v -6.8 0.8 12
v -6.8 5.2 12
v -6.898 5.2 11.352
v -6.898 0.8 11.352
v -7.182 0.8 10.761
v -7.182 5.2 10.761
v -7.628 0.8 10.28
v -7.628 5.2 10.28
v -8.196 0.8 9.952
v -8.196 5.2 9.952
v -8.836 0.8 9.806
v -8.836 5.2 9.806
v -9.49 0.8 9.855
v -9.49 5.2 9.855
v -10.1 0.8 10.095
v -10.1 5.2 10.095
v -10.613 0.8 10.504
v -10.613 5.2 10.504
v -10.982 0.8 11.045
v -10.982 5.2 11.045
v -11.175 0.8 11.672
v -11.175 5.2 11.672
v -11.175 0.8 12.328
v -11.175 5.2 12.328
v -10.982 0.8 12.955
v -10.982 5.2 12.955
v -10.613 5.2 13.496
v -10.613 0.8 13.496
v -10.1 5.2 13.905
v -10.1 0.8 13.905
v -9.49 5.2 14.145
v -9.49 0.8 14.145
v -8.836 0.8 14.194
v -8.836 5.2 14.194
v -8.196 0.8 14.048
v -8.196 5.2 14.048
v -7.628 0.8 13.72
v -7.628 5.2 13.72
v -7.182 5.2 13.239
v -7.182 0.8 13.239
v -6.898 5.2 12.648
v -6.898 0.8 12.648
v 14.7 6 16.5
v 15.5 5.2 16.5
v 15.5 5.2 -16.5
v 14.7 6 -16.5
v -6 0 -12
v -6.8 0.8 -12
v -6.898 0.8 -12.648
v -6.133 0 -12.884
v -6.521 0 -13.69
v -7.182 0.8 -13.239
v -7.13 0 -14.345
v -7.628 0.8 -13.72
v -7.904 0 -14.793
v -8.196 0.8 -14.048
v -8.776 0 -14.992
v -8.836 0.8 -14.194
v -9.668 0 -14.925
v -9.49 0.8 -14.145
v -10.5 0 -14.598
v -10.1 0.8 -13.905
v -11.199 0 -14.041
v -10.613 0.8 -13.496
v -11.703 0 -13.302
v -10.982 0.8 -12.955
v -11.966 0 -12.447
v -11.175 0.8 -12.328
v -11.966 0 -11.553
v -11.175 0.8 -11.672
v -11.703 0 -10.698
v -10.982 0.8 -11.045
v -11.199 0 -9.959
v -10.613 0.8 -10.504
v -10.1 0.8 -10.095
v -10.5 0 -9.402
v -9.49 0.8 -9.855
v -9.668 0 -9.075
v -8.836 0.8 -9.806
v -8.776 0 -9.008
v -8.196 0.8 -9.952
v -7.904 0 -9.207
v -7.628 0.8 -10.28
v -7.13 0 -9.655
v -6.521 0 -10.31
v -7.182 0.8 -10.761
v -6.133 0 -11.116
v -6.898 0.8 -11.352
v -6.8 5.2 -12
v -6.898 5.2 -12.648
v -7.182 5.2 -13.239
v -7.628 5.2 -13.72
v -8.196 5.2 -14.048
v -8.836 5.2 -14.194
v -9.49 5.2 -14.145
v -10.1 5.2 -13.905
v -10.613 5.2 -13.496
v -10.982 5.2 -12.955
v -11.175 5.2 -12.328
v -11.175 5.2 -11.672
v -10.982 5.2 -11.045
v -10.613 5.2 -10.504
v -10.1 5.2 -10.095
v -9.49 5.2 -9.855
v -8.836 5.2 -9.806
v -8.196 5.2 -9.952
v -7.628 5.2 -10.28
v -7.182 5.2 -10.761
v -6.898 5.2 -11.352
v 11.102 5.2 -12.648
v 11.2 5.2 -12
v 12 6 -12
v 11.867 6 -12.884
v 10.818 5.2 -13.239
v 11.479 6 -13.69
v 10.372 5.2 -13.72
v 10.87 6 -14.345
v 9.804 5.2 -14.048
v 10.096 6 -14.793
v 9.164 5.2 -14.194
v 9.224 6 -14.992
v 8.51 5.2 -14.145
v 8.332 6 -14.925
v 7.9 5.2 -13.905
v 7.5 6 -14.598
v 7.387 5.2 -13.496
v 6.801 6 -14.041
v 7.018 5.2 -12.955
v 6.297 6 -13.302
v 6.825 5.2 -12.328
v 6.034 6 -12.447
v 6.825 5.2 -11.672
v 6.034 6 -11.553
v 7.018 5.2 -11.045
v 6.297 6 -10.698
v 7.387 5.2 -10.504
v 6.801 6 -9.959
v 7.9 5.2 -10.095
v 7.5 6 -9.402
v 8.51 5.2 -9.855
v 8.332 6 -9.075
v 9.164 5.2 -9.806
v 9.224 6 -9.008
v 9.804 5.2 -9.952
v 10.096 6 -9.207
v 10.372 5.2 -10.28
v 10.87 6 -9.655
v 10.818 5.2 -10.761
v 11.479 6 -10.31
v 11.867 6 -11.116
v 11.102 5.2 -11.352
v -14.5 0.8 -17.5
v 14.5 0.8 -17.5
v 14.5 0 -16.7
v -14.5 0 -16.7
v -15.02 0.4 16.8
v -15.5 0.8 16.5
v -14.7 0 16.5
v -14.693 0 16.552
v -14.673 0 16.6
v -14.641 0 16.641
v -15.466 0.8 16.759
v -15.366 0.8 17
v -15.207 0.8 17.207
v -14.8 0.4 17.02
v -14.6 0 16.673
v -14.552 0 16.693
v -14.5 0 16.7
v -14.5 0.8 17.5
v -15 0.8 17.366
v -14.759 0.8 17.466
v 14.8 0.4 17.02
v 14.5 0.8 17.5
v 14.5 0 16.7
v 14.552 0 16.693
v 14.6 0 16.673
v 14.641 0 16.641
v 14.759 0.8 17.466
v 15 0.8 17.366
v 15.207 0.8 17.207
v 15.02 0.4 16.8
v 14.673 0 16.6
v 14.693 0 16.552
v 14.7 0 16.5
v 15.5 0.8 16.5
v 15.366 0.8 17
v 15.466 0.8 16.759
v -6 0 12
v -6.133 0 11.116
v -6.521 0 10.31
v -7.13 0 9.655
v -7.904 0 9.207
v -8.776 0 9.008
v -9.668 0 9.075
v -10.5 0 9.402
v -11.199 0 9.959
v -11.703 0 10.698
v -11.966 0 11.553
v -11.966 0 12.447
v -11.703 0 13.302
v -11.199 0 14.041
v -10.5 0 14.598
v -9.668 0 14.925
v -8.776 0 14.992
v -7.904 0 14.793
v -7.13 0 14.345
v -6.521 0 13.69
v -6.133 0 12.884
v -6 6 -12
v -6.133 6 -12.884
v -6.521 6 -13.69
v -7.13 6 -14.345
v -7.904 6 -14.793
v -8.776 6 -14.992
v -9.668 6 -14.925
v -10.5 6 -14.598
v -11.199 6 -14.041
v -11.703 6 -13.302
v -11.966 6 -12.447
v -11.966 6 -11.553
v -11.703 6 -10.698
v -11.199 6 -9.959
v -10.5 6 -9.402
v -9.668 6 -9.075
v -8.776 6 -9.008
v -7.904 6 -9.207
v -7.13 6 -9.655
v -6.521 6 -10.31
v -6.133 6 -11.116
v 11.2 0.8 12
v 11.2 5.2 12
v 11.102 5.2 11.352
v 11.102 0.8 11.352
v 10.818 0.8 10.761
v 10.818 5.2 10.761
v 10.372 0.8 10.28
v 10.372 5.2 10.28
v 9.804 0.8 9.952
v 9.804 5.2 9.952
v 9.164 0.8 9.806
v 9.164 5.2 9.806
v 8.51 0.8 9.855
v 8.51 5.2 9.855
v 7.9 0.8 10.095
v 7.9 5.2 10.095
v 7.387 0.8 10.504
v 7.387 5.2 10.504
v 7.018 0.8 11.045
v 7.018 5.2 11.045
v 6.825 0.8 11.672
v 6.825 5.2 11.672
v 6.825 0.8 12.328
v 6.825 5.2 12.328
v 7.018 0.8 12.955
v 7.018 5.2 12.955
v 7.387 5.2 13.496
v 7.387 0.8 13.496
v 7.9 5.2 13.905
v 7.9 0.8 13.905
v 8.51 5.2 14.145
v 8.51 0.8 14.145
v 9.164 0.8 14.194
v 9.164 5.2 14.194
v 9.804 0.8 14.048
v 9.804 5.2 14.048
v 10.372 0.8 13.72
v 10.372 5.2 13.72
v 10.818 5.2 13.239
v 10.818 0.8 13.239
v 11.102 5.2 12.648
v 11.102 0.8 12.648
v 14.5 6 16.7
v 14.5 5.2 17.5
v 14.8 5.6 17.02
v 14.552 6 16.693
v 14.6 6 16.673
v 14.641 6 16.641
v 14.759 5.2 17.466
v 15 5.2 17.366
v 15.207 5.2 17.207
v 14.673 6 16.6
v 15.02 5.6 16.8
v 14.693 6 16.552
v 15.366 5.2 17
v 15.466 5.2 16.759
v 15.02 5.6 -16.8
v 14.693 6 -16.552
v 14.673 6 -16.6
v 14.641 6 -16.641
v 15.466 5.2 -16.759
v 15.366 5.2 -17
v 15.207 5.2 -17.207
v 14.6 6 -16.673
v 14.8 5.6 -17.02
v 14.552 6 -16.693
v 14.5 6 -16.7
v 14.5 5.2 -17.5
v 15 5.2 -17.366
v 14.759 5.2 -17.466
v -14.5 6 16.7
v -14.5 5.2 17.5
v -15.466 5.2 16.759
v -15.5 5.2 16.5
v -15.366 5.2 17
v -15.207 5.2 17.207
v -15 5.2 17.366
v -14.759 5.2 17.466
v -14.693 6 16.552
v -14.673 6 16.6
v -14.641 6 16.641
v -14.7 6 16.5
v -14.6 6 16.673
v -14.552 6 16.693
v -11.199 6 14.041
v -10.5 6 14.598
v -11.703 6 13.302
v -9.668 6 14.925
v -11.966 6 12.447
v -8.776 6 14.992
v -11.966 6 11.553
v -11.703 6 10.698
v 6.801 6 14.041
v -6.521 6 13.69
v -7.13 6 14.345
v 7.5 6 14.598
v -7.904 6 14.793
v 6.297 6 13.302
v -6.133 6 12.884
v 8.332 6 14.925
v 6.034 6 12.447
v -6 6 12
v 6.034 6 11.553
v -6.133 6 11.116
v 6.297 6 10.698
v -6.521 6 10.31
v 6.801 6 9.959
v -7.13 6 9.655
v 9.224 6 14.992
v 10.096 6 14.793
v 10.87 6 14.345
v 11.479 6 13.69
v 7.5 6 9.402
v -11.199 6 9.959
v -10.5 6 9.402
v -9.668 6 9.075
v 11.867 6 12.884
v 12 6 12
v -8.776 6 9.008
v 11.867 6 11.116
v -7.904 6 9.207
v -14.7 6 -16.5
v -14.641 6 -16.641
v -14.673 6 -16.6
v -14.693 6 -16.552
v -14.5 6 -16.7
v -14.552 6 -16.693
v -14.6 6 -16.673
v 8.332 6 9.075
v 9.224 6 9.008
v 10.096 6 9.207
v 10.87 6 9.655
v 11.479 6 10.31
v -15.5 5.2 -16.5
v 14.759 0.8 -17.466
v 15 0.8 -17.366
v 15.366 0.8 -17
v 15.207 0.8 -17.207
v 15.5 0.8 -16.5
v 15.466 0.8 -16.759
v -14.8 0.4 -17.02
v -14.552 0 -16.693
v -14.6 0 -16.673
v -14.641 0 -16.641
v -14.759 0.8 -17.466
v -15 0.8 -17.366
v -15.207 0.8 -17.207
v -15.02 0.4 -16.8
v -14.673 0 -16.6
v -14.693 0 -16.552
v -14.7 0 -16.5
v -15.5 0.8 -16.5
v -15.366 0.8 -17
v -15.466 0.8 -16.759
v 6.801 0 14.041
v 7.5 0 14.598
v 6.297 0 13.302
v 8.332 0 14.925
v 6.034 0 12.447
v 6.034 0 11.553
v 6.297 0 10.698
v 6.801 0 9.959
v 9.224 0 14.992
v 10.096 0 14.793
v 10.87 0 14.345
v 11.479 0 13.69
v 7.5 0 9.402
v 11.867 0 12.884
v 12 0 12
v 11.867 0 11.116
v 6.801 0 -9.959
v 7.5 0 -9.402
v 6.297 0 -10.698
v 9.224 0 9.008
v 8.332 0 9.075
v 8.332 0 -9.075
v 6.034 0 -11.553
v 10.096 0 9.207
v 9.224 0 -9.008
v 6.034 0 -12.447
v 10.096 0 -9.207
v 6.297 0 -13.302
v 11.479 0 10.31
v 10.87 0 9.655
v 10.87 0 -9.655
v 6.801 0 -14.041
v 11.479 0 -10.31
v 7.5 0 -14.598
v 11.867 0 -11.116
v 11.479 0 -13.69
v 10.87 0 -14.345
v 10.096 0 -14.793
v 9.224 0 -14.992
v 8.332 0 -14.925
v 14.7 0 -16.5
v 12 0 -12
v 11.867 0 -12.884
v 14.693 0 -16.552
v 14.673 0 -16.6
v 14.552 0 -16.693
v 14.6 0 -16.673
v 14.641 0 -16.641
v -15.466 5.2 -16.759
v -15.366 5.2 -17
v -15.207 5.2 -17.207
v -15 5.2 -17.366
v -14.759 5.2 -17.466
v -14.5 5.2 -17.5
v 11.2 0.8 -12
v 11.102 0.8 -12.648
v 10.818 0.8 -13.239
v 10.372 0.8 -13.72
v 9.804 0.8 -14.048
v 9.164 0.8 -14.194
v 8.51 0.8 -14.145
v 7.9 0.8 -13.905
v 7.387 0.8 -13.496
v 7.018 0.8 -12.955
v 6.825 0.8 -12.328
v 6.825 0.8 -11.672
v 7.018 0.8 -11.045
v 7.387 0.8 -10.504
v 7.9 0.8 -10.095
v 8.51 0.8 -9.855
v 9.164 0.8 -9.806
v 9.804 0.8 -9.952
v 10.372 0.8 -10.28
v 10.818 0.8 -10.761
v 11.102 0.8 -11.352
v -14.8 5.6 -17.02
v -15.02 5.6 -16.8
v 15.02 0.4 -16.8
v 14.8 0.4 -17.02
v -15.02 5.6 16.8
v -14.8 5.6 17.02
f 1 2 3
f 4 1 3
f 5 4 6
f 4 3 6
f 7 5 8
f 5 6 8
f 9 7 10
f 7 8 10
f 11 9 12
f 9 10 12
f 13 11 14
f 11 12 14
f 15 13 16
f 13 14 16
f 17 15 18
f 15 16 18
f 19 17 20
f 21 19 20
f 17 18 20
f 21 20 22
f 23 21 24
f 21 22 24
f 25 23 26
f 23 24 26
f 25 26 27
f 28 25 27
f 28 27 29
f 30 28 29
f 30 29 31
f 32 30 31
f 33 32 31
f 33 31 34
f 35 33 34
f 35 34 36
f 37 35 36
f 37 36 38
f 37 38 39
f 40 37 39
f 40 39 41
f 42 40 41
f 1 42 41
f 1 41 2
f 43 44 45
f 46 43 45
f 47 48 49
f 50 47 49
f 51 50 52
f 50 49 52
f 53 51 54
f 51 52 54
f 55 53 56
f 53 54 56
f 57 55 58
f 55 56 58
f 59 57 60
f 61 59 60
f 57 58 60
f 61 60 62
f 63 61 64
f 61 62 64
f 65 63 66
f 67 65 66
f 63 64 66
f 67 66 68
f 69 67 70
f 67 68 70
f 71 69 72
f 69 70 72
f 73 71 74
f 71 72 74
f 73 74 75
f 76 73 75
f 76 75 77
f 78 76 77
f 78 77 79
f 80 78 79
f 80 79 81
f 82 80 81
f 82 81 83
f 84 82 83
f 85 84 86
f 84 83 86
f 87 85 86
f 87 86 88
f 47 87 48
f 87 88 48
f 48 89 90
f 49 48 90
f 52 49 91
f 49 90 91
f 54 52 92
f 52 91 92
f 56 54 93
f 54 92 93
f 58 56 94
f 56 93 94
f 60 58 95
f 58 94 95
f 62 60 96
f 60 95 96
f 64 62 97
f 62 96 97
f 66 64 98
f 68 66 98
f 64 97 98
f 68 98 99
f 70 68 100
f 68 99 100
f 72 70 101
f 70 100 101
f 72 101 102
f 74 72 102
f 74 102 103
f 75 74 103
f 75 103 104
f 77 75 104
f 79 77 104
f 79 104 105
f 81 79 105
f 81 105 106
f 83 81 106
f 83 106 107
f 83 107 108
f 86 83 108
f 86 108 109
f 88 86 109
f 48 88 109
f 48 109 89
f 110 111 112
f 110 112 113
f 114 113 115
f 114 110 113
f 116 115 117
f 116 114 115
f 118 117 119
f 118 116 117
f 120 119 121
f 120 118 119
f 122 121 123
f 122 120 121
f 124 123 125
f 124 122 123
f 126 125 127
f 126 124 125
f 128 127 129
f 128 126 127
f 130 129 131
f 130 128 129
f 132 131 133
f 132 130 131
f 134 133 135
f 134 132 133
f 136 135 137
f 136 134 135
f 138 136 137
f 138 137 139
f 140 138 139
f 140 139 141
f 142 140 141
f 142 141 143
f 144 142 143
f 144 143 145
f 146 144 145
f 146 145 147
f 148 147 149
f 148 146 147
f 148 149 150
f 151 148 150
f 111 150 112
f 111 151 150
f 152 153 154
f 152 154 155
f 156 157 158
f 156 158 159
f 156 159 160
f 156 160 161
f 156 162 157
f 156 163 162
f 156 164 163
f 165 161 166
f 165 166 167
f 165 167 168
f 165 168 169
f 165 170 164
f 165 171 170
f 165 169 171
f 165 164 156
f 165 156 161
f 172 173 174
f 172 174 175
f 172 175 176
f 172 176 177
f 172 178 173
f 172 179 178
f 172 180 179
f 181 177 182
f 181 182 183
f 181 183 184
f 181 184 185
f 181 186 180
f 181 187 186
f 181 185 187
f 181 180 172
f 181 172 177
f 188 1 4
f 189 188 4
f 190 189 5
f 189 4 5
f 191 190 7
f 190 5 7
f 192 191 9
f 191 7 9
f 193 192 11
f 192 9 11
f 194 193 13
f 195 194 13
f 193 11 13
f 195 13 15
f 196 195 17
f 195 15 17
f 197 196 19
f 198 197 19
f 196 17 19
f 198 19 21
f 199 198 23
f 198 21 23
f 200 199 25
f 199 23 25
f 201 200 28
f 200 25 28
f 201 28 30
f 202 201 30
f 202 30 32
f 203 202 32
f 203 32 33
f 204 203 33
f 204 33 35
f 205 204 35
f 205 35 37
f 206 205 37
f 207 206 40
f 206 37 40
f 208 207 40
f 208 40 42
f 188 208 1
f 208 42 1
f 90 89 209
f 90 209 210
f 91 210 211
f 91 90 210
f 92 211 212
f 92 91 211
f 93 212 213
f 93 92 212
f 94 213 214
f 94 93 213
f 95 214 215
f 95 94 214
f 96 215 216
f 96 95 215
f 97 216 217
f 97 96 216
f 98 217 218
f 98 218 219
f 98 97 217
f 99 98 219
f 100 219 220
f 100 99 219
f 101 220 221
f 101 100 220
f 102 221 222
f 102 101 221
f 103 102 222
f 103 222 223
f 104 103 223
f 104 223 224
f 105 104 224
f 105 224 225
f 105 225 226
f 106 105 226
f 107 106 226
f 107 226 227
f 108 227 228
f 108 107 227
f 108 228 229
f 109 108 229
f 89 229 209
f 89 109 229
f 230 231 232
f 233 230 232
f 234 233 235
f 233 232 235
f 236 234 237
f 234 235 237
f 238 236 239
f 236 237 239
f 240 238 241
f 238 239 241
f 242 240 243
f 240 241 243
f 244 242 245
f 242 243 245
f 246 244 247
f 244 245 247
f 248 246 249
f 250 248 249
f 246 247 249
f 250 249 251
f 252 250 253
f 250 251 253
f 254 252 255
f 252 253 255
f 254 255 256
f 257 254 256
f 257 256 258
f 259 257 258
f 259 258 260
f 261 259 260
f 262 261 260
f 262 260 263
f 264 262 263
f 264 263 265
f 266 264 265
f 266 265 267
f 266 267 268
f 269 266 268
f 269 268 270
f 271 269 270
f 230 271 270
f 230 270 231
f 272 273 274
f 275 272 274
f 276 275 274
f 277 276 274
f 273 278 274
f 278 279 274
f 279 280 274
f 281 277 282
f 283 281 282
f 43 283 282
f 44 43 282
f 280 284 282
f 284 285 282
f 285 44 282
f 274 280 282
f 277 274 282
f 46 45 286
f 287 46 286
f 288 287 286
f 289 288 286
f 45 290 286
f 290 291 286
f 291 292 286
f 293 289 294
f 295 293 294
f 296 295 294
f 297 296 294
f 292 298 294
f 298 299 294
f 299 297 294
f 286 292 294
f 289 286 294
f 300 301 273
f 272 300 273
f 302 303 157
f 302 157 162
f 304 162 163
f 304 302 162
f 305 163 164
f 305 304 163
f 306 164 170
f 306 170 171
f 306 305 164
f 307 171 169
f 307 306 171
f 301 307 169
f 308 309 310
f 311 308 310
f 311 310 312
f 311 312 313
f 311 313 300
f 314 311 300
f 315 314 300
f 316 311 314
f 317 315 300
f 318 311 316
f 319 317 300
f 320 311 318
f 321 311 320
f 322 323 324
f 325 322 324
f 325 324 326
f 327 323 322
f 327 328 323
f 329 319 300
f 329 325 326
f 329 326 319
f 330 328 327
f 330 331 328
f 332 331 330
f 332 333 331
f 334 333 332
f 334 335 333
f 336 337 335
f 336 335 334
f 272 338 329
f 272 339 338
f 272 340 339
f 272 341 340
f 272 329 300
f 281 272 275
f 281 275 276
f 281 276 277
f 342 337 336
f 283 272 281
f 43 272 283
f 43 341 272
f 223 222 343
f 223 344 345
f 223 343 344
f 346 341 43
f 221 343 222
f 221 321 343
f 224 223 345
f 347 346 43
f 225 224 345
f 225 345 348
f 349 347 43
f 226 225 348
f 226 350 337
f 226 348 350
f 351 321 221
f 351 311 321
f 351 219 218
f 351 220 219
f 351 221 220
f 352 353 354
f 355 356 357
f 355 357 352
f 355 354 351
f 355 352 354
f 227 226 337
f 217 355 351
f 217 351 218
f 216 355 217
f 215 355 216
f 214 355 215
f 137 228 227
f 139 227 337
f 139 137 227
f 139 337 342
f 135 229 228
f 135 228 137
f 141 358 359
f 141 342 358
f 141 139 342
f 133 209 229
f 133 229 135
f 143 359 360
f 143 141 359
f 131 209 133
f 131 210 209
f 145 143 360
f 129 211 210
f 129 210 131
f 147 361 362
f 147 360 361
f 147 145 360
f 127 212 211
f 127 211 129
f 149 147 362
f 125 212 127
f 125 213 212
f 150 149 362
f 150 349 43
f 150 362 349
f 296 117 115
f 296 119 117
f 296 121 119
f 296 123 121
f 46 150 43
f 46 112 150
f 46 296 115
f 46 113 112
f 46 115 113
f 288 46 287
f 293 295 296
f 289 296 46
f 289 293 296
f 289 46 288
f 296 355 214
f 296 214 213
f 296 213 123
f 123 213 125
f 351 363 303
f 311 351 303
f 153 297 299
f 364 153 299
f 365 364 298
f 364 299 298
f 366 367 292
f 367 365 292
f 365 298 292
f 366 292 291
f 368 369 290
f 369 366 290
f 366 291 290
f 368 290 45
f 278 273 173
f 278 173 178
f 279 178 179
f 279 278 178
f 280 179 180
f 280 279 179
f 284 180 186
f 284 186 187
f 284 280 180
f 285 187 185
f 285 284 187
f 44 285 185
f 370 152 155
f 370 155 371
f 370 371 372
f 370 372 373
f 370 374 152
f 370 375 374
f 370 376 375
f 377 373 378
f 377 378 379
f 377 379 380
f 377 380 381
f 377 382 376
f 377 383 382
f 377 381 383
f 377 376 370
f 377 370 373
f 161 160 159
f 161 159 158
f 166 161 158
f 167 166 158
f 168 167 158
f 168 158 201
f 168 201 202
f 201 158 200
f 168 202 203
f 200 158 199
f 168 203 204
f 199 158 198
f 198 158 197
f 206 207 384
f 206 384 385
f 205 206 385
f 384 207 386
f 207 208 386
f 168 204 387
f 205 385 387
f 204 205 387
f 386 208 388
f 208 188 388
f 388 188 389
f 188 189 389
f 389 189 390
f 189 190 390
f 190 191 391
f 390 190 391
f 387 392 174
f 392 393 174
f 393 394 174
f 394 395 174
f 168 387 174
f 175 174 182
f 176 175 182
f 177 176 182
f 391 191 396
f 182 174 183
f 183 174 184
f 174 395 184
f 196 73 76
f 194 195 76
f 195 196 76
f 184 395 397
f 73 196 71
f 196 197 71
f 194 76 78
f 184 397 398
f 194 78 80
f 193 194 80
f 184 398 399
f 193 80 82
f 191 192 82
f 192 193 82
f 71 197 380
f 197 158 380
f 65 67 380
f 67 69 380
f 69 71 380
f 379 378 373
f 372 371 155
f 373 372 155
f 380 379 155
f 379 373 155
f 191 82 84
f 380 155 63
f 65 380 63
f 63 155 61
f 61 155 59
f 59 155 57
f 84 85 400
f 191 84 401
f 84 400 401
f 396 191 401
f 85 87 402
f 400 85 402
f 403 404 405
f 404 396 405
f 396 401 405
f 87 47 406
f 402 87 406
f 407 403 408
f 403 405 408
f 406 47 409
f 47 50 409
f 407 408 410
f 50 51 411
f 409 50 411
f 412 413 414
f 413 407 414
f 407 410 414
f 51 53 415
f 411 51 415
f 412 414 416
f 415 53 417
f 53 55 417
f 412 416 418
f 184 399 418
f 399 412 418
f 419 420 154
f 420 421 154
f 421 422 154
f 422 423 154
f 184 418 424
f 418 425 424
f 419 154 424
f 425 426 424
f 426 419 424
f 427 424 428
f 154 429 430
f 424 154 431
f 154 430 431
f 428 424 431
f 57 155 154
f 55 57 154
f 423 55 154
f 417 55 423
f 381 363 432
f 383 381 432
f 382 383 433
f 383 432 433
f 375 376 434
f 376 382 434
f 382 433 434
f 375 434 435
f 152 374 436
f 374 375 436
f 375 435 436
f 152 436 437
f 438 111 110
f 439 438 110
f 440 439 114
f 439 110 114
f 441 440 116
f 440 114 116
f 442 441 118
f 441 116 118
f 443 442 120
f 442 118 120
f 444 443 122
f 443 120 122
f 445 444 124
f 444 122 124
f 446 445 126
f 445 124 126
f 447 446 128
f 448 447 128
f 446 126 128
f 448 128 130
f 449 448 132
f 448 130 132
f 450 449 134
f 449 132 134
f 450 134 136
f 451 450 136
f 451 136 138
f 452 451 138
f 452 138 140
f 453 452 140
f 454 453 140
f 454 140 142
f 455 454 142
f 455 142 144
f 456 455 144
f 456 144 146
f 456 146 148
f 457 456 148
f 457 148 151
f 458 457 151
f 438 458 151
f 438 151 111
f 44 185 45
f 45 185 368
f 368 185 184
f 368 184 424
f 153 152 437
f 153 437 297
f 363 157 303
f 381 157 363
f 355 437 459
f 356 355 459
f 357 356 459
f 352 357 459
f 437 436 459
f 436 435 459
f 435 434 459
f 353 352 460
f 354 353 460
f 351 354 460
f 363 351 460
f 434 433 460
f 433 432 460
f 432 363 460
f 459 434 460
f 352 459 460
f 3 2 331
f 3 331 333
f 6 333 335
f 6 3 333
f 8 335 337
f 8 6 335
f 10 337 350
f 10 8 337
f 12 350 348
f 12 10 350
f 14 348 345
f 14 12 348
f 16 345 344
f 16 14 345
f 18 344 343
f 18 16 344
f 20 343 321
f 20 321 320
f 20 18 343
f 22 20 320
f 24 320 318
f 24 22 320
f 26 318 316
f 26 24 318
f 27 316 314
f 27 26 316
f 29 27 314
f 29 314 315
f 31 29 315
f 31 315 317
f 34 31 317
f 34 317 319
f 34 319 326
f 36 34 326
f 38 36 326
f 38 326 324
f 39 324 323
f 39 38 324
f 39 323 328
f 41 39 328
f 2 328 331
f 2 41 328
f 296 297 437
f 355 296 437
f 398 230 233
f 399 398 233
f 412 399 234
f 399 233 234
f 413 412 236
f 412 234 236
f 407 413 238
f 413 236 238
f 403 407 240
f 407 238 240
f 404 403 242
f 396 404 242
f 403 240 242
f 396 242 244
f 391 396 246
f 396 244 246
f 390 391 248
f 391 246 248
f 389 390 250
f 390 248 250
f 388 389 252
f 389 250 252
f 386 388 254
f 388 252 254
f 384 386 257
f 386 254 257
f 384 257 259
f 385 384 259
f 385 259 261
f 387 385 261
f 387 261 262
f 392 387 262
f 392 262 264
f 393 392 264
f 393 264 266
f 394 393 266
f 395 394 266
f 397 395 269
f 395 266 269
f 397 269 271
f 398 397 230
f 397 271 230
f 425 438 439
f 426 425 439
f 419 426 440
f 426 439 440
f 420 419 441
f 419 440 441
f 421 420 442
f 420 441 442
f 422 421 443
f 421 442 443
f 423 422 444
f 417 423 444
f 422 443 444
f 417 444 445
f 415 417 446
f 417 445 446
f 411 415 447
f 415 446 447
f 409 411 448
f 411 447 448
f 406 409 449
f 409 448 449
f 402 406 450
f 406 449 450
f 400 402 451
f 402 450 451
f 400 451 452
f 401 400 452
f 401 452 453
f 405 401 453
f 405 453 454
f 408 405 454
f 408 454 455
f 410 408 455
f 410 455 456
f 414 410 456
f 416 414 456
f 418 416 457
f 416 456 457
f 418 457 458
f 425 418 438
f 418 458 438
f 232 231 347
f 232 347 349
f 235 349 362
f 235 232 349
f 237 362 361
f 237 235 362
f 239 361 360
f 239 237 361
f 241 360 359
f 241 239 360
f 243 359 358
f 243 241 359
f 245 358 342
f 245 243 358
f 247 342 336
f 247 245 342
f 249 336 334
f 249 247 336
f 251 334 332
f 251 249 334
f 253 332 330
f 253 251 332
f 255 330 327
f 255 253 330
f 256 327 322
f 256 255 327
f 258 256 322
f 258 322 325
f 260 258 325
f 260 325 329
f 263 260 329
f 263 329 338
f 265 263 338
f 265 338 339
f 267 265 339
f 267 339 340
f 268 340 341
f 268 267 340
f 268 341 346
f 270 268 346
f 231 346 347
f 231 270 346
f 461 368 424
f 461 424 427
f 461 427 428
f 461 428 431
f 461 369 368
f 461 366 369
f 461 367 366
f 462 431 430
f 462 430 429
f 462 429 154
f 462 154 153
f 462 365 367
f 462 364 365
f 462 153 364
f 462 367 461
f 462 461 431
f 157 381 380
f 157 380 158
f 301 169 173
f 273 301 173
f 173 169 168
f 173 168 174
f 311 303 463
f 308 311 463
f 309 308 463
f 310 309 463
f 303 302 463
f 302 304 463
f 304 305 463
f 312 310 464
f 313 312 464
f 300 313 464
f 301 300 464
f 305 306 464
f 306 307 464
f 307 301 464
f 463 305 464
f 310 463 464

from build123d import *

# Parameters (mm, degrees)
SKETCH1_W           = 31
SKETCH1_H           = 35
BOSS_EXTRUDE1_DEPTH = 6
SKETCH2_R           = 2.2
CUT_EXTRUDE1_DEPTH  = 7
FILLET1_R           = 1
CHAMFER1_SIZE       = 0.8


with BuildPart() as part:
    # Sketch1 → Boss-Extrude1 (new body)
    with BuildSketch(Plane(origin=(0, 0, 0), x_dir=(1, 0, 0), z_dir=(0, 1, 0))):
        Rectangle(SKETCH1_W, SKETCH1_H)
    extrude(amount=BOSS_EXTRUDE1_DEPTH)

    # Sketch2 → Cut-Extrude1 (cut, through all)
    with BuildSketch(Plane(origin=(0, 6, 0), x_dir=(1, 0, 0), z_dir=(0, 1, 0))):
        with Locations((9, 12)):
            Circle(SKETCH2_R)
        with Locations((9, -12)):
            Circle(SKETCH2_R)
        with Locations((-9, 12)):
            Circle(SKETCH2_R)
        with Locations((-9, -12)):
            Circle(SKETCH2_R)
    extrude(amount=-CUT_EXTRUDE1_DEPTH, mode=Mode.SUBTRACT)

    # Fillet1
    fillet1_edges = [part.edges().sort_by_distance(p)[0] for p in [
        (15.5, 3, 17.5),
        (-15.5, 3, 17.5),
        (-15.5, 3, -17.5),
        (15.5, 3, -17.5),
    ]]
    fillet(fillet1_edges, radius=FILLET1_R)

    # Chamfer1
    chamfer1_edges = [part.edges().sort_by_distance(p)[0] for p in [
        (6.8, 0, 12),
        (6.8, 6, 12),
        (-11.2, 0, -12),
        (-11.2, 6, -12),
        (-11.2, 0, 12),
        (-11.2, 6, 12),
        (6.8, 0, -12),
        (6.8, 6, -12),
        (0, 0, 17.5),
        (0, 6, 17.5),
        (15.5, 0, 0),
        (-15.5, 0, 0),
        (0, 0, -17.5),
        (15.207106781, 0, 17.207106781),
        (15.207106781, 0, -17.207106781),
        (-15.207106781, 0, -17.207106781),
        (-15.207106781, 0, 17.207106781),
        (-15.5, 6, 0),
        (15.5, 6, 0),
        (0, 6, -17.5),
        (15.207106781, 6, 17.207106781),
        (15.207106781, 6, -17.207106781),
        (-15.207106781, 6, -17.207106781),
        (-15.207106781, 6, 17.207106781),
    ]]
    chamfer(chamfer1_edges, length=CHAMFER1_SIZE)


solid = part.part
